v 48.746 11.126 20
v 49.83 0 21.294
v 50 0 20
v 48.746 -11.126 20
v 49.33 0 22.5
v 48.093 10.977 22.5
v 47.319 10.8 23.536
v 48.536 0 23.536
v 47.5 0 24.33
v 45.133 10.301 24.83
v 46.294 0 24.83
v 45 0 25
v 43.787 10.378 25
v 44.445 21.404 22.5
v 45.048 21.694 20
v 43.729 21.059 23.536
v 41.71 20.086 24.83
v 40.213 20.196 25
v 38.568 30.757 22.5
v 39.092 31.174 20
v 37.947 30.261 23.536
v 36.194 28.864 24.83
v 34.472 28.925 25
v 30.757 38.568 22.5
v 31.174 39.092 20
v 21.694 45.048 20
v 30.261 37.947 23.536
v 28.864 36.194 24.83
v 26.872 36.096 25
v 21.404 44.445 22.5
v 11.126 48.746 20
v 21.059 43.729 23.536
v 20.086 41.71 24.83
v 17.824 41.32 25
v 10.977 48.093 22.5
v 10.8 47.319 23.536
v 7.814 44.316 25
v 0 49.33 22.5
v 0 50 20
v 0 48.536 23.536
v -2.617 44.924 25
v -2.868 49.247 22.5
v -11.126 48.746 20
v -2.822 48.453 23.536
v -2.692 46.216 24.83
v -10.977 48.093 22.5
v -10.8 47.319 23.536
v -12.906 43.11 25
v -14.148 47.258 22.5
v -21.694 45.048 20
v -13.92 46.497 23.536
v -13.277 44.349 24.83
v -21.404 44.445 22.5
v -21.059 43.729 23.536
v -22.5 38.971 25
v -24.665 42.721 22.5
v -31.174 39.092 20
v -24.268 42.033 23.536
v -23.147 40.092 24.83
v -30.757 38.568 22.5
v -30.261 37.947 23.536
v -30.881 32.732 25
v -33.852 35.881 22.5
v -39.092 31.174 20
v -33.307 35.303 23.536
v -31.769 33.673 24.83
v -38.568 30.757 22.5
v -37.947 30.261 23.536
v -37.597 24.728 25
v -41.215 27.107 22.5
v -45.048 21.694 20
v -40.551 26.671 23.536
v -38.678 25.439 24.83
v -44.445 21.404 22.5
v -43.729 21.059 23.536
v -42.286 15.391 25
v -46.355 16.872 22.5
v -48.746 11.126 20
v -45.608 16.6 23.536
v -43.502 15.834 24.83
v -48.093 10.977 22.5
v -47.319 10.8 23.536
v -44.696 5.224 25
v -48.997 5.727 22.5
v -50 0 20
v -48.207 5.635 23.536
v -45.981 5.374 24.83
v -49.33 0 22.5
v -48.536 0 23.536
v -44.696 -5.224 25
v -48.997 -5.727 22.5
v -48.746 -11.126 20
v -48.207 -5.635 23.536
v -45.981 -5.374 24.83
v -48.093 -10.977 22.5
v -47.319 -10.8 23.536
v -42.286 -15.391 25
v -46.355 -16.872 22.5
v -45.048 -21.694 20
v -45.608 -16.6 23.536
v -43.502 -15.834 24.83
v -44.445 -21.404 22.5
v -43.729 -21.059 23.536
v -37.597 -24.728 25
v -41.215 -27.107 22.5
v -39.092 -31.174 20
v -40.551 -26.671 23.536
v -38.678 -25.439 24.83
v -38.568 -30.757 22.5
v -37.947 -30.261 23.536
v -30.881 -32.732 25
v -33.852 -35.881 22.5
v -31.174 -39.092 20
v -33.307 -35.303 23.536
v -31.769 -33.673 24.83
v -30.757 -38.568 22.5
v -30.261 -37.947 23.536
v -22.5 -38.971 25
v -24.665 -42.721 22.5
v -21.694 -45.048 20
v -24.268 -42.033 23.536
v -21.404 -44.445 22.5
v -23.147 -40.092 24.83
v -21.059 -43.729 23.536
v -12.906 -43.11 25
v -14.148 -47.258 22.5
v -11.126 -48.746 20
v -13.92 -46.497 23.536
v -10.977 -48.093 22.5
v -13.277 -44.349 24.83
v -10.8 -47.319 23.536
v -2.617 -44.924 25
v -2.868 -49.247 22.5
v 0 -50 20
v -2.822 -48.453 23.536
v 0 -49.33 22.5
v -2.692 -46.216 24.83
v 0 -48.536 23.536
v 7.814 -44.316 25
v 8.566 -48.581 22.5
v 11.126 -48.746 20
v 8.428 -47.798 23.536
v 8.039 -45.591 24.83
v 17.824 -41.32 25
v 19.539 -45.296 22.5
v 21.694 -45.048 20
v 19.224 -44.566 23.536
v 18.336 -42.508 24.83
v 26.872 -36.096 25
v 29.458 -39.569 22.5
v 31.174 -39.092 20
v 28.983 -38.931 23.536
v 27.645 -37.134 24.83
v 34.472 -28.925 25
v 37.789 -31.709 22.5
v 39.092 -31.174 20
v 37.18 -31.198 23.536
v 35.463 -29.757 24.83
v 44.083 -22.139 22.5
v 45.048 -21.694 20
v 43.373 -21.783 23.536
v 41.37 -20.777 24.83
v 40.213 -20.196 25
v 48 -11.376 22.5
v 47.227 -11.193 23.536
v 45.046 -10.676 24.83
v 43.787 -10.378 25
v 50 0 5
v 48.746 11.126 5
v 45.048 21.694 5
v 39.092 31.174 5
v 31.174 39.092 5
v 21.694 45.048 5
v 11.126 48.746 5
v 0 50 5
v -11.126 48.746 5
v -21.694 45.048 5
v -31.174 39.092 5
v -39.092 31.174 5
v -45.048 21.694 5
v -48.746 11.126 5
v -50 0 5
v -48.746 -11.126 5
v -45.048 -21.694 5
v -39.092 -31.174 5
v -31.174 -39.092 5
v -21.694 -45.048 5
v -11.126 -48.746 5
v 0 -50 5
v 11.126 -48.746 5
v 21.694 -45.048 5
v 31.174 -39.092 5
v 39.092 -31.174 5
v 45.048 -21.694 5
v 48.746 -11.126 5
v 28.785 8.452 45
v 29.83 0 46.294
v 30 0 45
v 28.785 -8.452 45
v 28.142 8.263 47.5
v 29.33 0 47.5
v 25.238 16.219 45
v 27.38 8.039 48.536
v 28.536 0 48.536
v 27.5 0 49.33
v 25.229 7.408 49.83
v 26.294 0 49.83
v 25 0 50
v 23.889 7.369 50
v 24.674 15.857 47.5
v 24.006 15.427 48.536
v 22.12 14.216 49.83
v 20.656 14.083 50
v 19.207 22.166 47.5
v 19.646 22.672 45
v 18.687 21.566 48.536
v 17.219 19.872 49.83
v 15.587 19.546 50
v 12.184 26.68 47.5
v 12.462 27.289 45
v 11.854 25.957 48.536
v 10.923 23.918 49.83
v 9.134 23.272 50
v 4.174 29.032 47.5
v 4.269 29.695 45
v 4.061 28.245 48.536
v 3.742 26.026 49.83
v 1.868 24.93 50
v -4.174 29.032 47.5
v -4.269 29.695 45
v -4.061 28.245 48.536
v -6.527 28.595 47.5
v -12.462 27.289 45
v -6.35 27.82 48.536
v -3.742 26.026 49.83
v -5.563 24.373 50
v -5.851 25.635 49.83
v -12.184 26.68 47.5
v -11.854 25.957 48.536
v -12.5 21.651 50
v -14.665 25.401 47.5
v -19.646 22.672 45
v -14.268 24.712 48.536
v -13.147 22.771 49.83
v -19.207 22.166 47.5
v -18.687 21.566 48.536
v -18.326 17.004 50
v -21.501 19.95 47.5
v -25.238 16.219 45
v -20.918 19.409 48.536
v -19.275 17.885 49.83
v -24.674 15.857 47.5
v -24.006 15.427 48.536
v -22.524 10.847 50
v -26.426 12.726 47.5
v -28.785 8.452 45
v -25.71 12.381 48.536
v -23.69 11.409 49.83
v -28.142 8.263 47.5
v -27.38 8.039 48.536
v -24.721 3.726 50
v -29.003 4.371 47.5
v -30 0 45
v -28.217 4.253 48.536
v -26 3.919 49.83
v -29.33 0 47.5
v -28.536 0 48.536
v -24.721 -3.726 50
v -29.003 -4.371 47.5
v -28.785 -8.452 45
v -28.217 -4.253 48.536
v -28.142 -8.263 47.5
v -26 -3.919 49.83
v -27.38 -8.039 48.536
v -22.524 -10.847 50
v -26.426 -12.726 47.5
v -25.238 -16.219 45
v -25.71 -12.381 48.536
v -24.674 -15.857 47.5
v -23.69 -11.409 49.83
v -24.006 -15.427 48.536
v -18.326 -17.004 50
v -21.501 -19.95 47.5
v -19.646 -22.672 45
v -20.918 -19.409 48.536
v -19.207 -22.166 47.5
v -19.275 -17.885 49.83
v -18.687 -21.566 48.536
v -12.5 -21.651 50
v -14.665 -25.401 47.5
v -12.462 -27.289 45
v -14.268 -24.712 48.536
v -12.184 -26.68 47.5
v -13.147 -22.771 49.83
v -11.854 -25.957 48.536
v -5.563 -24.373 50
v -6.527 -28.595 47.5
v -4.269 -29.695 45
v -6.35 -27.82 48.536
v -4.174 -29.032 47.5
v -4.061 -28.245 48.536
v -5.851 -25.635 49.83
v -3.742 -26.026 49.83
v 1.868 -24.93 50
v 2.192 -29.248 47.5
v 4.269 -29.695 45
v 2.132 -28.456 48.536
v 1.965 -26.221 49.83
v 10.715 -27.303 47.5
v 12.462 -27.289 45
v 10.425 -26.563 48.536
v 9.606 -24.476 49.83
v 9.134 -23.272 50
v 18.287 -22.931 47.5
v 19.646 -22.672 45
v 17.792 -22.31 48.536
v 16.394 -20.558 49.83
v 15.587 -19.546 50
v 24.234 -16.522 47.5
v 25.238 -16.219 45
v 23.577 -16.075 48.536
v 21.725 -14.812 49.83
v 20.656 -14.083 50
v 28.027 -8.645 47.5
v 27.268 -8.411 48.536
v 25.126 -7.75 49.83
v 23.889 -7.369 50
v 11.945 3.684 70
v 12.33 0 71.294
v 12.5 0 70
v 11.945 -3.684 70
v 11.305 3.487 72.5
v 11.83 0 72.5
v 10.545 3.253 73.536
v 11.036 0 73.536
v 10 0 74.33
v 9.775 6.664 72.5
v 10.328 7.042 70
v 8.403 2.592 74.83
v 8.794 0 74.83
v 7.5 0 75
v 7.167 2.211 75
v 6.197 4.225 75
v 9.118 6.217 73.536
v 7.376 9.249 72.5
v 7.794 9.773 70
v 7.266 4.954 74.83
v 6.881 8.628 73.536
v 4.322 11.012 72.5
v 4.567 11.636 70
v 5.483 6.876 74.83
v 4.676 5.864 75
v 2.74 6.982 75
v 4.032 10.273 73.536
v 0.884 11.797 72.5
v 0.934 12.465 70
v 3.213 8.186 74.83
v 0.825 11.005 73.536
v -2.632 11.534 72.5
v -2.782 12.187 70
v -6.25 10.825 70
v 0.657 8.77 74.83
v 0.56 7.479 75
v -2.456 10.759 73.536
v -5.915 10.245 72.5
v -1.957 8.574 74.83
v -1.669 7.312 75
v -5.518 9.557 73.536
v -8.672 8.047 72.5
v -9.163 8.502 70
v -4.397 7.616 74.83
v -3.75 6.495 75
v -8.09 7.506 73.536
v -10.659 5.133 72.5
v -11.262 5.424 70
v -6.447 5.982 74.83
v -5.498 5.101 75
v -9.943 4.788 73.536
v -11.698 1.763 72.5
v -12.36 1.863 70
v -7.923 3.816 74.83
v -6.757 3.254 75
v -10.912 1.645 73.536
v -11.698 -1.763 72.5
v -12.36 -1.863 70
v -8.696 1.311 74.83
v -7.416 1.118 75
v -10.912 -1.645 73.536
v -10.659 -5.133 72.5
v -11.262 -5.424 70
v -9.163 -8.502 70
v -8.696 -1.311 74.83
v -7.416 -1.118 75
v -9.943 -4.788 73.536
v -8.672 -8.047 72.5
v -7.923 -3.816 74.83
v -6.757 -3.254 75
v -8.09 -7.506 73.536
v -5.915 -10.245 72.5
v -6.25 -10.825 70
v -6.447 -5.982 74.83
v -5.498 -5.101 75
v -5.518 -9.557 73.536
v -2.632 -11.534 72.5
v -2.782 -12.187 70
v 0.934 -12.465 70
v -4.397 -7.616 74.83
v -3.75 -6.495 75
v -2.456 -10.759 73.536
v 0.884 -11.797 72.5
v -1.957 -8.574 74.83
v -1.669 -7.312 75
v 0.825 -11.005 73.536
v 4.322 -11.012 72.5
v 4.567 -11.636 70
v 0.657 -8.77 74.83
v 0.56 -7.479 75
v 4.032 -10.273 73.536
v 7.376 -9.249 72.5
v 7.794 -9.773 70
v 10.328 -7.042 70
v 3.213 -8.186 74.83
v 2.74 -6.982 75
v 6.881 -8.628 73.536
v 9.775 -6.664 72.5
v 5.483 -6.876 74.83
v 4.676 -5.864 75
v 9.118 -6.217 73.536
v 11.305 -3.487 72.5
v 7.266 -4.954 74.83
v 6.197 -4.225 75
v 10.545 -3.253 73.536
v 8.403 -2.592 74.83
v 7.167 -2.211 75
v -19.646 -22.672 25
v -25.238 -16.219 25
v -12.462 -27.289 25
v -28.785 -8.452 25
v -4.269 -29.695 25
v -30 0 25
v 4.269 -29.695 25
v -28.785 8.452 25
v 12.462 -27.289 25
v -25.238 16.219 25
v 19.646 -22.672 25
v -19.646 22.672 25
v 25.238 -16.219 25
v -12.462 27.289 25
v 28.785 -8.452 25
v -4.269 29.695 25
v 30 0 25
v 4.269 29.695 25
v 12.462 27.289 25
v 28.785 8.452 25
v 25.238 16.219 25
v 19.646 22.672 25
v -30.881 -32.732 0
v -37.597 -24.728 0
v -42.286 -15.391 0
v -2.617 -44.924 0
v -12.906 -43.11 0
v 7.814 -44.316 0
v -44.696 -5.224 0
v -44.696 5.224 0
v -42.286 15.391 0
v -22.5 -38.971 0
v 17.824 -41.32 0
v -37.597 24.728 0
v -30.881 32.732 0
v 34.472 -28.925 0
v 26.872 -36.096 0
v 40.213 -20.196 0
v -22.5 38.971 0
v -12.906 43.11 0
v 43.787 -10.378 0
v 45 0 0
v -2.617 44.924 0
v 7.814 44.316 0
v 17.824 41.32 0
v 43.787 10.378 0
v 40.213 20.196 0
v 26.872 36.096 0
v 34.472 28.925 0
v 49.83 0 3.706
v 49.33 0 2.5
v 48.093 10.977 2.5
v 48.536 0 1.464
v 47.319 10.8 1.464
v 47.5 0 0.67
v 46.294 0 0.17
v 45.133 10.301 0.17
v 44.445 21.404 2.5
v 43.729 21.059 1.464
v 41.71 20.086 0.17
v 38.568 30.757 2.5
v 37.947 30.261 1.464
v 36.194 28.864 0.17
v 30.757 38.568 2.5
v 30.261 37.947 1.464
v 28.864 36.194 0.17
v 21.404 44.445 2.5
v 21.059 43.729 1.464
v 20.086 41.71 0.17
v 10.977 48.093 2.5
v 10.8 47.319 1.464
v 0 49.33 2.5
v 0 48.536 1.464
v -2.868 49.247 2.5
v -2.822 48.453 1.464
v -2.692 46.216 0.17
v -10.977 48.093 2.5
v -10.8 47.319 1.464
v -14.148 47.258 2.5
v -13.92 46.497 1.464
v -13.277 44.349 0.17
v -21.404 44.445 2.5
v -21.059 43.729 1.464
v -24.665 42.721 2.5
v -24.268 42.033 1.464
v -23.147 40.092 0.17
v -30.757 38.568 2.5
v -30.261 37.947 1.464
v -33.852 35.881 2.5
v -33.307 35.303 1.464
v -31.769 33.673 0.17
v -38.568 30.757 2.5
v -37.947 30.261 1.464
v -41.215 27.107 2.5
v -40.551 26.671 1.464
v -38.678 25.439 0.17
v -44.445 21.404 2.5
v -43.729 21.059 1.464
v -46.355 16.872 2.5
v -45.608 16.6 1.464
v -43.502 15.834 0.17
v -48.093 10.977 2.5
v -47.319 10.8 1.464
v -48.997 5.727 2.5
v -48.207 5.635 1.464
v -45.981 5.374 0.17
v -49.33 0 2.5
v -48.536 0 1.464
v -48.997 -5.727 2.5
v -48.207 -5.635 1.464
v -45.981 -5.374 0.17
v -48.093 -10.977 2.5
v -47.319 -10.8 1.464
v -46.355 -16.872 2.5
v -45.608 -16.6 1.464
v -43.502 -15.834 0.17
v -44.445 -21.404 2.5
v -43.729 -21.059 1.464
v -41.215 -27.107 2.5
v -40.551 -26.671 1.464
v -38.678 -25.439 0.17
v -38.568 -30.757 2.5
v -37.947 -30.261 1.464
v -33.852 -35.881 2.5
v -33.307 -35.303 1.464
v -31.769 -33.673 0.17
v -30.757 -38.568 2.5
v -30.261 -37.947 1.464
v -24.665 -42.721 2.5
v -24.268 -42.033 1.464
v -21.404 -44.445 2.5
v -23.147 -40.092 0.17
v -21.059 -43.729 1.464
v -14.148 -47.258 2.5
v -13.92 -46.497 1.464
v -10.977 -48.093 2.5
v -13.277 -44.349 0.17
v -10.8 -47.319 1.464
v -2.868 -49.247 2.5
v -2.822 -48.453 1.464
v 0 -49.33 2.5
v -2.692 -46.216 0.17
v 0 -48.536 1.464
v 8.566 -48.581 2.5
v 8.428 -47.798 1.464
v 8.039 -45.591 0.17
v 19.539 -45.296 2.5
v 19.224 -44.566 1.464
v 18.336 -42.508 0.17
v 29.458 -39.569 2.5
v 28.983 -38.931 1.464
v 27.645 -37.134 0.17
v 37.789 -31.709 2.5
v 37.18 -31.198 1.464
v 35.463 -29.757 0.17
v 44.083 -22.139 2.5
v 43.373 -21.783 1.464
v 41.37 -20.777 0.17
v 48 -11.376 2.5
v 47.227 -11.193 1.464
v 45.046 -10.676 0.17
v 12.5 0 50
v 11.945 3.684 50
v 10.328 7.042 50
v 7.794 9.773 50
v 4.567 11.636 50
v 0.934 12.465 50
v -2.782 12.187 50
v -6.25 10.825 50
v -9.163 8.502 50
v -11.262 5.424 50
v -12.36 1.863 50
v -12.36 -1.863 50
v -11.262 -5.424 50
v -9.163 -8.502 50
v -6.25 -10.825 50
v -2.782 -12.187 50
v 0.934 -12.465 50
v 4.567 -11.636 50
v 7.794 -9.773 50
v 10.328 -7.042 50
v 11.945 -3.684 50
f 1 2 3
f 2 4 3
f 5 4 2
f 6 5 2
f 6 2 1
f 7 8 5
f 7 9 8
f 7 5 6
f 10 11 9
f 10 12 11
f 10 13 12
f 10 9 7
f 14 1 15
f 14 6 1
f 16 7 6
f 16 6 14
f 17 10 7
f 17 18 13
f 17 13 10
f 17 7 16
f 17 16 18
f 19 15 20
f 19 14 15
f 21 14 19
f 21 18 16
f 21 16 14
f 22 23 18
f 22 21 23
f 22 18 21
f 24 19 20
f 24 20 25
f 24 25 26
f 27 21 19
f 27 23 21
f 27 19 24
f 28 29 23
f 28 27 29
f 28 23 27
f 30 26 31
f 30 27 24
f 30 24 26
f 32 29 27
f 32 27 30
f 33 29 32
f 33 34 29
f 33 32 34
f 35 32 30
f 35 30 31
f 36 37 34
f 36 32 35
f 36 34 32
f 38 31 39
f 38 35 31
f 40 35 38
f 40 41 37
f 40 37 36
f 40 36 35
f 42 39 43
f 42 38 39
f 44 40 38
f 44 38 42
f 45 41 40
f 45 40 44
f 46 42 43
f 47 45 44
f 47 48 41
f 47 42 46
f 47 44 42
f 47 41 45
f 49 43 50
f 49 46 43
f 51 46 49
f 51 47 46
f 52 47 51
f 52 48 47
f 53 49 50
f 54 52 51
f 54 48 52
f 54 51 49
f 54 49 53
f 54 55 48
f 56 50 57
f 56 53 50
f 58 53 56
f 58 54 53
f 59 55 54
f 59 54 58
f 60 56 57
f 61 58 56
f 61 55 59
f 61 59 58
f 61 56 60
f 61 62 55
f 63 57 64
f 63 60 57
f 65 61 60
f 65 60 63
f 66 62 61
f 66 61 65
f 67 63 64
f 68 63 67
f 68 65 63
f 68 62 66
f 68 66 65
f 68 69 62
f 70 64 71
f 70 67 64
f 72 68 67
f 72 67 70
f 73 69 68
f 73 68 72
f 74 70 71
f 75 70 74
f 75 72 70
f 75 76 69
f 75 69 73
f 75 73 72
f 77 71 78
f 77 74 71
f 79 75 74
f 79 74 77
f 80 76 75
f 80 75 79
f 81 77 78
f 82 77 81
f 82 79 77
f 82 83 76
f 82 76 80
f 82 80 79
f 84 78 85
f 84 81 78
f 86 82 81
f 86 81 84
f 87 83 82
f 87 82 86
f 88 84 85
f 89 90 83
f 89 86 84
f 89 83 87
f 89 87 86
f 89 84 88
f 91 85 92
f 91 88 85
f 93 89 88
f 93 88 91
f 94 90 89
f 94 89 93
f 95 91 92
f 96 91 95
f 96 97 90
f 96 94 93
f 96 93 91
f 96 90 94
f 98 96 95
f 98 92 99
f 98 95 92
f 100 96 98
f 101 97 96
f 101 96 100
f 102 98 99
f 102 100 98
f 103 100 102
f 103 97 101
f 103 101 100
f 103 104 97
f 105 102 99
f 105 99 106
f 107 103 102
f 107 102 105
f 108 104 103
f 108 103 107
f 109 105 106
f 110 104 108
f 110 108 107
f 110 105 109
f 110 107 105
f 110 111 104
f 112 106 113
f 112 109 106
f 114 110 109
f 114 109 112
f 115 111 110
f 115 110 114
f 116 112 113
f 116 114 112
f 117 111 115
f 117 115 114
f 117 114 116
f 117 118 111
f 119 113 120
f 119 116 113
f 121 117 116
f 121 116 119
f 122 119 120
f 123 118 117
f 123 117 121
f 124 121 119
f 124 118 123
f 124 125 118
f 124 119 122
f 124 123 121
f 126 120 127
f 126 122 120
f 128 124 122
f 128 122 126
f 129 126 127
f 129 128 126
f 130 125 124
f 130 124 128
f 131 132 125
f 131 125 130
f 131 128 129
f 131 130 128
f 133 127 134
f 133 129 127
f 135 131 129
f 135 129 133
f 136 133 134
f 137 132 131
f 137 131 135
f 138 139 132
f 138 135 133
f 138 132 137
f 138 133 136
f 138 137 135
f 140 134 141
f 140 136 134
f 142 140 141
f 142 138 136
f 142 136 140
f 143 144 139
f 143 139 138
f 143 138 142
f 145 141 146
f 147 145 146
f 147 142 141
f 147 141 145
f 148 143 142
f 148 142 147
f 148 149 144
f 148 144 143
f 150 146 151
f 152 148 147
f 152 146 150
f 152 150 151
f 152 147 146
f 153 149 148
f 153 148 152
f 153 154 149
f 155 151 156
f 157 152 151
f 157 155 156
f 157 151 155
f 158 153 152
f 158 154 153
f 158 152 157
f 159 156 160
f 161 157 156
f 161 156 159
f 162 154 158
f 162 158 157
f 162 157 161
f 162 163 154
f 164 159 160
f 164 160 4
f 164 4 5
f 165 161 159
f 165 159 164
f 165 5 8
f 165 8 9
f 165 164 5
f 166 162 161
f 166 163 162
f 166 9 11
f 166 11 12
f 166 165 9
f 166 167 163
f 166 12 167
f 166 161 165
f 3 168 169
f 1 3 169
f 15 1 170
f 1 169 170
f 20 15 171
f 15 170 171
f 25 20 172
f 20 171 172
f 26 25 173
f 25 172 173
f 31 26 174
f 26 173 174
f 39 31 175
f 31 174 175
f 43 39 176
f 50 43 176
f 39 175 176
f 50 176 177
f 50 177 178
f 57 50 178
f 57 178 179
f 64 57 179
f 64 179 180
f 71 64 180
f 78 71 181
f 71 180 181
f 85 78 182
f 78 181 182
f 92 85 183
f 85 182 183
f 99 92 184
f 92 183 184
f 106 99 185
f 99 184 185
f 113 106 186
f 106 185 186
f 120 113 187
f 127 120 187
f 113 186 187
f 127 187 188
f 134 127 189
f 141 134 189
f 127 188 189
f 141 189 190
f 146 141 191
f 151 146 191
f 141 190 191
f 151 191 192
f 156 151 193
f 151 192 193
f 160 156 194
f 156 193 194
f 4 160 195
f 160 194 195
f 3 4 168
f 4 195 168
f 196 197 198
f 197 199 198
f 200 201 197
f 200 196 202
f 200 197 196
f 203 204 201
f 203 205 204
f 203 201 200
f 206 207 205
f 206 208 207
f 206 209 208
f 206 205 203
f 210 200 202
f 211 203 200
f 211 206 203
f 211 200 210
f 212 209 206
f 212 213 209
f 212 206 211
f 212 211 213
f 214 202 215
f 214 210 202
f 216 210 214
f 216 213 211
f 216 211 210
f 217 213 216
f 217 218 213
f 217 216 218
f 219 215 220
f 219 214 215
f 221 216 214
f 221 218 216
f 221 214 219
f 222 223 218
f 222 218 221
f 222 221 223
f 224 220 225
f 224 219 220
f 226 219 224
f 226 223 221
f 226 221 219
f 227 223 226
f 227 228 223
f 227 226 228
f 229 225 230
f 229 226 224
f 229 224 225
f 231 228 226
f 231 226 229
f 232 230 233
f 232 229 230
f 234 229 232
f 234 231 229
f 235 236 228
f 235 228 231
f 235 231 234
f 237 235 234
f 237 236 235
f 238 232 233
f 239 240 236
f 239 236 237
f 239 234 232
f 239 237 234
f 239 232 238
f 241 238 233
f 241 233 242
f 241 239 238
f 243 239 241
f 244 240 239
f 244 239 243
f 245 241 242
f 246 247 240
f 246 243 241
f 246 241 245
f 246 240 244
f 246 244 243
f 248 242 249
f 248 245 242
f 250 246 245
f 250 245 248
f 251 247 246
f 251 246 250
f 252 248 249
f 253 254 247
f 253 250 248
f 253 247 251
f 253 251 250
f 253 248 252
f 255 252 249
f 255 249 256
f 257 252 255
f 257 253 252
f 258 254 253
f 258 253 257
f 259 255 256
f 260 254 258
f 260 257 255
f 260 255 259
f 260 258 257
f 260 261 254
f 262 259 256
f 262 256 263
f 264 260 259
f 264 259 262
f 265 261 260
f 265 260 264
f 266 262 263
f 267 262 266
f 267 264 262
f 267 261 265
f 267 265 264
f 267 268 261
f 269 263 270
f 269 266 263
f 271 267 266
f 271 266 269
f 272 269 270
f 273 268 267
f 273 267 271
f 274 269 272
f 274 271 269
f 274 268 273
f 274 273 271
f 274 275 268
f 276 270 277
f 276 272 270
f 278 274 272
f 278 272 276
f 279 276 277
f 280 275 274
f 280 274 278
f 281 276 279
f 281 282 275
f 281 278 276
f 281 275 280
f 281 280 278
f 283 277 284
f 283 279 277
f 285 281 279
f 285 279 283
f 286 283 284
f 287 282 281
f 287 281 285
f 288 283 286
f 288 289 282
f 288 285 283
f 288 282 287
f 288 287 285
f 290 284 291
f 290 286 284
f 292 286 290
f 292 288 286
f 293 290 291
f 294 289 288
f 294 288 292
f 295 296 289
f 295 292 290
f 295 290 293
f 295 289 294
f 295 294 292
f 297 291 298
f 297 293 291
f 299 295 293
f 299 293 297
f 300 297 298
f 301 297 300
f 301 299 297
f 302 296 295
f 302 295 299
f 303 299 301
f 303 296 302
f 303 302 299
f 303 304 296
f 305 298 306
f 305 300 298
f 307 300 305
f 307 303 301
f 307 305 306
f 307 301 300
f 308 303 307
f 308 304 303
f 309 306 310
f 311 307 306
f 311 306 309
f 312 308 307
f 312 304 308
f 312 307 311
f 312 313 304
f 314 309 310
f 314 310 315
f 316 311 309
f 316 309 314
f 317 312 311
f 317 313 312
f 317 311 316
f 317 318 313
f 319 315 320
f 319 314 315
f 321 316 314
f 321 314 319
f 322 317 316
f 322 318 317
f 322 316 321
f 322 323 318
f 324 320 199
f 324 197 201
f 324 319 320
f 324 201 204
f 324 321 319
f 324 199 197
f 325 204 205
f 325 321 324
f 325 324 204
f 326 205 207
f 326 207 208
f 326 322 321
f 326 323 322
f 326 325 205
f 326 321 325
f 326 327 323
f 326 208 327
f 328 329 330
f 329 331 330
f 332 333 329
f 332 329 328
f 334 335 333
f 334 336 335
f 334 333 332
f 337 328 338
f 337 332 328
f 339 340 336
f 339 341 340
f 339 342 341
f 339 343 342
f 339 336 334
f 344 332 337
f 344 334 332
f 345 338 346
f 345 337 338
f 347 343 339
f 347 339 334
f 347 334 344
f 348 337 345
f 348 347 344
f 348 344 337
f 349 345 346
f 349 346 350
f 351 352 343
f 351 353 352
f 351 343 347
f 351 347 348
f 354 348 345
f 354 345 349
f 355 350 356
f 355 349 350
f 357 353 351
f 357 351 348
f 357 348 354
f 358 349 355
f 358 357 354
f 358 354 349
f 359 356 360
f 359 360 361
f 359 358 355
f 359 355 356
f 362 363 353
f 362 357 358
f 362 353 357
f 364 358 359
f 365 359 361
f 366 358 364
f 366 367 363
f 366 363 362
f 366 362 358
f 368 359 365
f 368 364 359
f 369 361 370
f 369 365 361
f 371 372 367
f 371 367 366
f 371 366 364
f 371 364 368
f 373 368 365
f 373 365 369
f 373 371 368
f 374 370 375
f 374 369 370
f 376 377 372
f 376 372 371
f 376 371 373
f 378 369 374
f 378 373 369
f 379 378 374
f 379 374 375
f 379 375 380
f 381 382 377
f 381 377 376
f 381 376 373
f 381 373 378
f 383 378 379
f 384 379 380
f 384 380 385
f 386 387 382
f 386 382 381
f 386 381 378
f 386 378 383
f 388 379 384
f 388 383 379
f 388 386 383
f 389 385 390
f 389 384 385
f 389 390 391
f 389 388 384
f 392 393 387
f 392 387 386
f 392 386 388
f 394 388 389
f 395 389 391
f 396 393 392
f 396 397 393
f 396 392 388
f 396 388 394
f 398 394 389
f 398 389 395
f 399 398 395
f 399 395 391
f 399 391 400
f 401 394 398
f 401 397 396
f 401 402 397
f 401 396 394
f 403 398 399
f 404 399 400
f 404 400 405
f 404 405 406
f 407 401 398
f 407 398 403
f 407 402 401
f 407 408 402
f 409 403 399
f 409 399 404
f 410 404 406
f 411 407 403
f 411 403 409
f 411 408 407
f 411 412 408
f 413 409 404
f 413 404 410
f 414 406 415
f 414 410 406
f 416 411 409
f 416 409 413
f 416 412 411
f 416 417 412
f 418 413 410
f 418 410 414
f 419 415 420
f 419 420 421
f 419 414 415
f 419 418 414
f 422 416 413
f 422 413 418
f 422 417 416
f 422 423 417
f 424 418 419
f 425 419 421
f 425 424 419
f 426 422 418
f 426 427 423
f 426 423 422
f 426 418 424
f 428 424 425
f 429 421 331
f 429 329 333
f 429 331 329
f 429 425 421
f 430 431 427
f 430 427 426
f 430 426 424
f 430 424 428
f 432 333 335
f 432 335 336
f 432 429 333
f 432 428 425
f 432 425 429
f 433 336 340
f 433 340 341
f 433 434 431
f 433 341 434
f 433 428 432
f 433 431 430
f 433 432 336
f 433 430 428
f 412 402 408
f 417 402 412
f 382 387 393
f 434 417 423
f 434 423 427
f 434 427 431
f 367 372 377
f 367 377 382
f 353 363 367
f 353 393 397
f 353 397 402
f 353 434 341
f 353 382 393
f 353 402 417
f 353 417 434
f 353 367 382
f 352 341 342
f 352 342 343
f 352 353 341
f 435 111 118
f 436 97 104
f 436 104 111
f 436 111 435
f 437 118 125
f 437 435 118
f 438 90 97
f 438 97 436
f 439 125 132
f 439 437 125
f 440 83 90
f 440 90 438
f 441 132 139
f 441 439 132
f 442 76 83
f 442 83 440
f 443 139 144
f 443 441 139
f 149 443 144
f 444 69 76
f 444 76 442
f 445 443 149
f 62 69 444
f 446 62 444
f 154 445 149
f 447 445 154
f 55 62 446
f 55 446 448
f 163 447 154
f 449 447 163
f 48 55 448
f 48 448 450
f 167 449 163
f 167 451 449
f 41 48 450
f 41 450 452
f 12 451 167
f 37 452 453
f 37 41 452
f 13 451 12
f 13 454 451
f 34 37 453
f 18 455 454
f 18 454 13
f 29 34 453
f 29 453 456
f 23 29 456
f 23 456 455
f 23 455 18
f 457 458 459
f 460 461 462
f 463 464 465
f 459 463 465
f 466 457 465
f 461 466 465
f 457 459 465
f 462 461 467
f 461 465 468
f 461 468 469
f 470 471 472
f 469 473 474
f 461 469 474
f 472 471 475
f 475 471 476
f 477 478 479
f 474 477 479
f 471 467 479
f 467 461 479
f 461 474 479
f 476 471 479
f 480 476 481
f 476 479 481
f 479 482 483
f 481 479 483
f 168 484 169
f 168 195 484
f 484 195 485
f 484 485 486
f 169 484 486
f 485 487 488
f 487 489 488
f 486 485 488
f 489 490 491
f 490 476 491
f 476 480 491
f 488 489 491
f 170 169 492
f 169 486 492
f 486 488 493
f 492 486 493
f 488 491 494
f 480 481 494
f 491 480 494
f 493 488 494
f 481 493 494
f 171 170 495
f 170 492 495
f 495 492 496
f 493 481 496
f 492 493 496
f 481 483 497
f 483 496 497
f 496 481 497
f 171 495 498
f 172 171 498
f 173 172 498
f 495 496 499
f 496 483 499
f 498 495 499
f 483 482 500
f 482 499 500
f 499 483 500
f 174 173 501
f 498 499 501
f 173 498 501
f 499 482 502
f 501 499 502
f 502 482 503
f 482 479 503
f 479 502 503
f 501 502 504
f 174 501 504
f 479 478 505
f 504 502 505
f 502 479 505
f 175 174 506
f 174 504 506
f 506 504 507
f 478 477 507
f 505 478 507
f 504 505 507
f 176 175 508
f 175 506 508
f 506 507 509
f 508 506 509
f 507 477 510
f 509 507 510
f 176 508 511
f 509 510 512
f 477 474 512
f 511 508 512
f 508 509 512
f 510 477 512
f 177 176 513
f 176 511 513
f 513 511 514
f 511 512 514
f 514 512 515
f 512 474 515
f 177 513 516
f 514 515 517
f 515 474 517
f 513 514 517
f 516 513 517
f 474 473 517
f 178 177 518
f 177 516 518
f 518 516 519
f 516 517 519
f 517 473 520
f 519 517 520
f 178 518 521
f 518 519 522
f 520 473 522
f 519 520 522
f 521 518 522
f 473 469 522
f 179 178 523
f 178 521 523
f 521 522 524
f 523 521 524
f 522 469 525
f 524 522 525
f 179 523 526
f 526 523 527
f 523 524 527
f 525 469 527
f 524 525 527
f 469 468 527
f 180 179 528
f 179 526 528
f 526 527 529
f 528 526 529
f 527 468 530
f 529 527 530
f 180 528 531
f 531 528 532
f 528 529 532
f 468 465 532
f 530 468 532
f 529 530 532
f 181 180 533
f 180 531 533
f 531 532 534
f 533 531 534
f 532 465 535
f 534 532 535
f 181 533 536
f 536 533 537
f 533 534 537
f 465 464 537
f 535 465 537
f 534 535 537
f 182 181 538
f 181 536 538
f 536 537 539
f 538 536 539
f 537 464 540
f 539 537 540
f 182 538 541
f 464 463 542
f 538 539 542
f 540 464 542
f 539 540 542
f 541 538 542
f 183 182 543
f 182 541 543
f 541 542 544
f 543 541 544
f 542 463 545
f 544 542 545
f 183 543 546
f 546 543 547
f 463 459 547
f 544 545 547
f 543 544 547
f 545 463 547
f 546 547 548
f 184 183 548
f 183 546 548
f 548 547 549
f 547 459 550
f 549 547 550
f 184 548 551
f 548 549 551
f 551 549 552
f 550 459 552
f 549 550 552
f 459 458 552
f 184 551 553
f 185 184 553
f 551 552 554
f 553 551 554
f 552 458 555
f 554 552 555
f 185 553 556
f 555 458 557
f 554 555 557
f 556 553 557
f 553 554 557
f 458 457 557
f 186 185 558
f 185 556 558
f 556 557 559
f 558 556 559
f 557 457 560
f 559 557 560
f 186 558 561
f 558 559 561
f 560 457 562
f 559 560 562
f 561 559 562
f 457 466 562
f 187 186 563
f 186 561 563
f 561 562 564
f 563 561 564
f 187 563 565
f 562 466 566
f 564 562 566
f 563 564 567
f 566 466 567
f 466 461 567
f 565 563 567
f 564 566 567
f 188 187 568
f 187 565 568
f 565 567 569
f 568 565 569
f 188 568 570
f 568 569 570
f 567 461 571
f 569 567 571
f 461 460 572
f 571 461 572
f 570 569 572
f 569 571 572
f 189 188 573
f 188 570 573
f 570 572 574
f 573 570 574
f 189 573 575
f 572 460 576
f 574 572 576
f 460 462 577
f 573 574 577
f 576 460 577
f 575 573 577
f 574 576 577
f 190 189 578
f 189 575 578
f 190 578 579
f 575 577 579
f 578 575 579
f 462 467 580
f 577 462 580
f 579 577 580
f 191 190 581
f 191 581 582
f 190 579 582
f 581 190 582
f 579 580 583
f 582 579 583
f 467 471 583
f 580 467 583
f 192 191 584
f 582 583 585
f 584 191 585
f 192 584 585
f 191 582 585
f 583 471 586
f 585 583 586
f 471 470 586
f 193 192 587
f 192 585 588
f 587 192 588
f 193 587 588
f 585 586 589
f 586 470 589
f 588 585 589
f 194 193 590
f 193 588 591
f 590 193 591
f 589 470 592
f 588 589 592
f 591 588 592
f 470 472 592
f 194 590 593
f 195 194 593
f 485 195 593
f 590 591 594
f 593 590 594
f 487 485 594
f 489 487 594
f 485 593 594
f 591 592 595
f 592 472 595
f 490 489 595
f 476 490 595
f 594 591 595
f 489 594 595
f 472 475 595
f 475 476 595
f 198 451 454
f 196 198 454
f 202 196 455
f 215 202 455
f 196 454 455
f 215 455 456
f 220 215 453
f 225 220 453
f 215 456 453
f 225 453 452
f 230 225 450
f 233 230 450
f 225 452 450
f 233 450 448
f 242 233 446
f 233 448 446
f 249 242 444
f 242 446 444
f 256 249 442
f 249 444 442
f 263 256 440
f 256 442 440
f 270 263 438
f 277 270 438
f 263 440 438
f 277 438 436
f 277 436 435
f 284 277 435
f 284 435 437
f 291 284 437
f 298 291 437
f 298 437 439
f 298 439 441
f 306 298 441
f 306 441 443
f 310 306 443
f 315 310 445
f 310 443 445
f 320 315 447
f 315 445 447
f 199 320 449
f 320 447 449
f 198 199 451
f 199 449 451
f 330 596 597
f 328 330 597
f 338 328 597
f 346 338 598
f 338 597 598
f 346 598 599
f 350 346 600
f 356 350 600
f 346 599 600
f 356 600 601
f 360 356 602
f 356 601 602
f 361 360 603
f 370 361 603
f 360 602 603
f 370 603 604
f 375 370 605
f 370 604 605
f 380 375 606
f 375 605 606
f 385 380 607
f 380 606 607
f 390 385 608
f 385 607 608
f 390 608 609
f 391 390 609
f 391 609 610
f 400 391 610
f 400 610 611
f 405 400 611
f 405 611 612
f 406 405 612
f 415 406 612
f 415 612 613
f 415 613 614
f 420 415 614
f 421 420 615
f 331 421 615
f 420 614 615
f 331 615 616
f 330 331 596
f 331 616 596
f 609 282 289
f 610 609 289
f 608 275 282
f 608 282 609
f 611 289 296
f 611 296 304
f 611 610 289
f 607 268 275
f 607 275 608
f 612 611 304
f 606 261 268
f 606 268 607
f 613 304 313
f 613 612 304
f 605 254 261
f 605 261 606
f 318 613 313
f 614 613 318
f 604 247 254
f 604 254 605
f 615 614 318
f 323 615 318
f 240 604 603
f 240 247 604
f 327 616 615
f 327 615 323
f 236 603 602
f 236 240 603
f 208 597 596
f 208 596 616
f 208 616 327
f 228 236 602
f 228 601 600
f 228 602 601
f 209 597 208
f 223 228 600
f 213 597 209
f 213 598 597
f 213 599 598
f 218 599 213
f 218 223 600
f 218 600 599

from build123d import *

# Parameters (mm, degrees)
F1_R      = 30
F2_DEPTH  = 25
F0_R      = 50
F2_FACE_R = 30
F3_DEPTH  = 25
F4_R      = 5
F5_R      = 5
F6_R      = 5
F7_R      = 12.5
F8_DEPTH  = 25
F9_R      = 5


with BuildPart() as f2:
    # F1 (on face) → F2 (new body)
    with BuildSketch(Plane.XY):
        Circle(F1_R)
    extrude(amount=F2_DEPTH)

    # F0 (on Top) + F2_face (on face) → F3 (join)
    with BuildSketch(Plane.XY):
        Circle(F0_R)
    with BuildSketch(Plane.XY.offset(25)):
        Circle(F2_FACE_R)
    extrude(amount=F3_DEPTH)

    # F4
    f4_edges = [f2.edges().sort_by_distance(p)[0] for p in [
        (-50, 0, 25),
    ]]
    fillet(f4_edges, radius=F4_R)

    # F5
    f5_edges = [f2.edges().sort_by_distance(p)[0] for p in [
        (-30, 0, 50),
    ]]
    fillet(f5_edges, radius=F5_R)

    # F6
    f6_edges = [f2.edges().sort_by_distance(p)[0] for p in [
        (-50, 0, 0),
    ]]
    fillet(f6_edges, radius=F6_R)

    # F7 (on face) → F8 (join)
    with BuildSketch(Plane.XY.offset(50)):
        Circle(F7_R)
    extrude(amount=F8_DEPTH)

    # F9
    f9_edges = [f2.edges().sort_by_distance(p)[0] for p in [
        (-12.5, 0, 75),
    ]]
    fillet(f9_edges, radius=F9_R)


solid = f2.part
